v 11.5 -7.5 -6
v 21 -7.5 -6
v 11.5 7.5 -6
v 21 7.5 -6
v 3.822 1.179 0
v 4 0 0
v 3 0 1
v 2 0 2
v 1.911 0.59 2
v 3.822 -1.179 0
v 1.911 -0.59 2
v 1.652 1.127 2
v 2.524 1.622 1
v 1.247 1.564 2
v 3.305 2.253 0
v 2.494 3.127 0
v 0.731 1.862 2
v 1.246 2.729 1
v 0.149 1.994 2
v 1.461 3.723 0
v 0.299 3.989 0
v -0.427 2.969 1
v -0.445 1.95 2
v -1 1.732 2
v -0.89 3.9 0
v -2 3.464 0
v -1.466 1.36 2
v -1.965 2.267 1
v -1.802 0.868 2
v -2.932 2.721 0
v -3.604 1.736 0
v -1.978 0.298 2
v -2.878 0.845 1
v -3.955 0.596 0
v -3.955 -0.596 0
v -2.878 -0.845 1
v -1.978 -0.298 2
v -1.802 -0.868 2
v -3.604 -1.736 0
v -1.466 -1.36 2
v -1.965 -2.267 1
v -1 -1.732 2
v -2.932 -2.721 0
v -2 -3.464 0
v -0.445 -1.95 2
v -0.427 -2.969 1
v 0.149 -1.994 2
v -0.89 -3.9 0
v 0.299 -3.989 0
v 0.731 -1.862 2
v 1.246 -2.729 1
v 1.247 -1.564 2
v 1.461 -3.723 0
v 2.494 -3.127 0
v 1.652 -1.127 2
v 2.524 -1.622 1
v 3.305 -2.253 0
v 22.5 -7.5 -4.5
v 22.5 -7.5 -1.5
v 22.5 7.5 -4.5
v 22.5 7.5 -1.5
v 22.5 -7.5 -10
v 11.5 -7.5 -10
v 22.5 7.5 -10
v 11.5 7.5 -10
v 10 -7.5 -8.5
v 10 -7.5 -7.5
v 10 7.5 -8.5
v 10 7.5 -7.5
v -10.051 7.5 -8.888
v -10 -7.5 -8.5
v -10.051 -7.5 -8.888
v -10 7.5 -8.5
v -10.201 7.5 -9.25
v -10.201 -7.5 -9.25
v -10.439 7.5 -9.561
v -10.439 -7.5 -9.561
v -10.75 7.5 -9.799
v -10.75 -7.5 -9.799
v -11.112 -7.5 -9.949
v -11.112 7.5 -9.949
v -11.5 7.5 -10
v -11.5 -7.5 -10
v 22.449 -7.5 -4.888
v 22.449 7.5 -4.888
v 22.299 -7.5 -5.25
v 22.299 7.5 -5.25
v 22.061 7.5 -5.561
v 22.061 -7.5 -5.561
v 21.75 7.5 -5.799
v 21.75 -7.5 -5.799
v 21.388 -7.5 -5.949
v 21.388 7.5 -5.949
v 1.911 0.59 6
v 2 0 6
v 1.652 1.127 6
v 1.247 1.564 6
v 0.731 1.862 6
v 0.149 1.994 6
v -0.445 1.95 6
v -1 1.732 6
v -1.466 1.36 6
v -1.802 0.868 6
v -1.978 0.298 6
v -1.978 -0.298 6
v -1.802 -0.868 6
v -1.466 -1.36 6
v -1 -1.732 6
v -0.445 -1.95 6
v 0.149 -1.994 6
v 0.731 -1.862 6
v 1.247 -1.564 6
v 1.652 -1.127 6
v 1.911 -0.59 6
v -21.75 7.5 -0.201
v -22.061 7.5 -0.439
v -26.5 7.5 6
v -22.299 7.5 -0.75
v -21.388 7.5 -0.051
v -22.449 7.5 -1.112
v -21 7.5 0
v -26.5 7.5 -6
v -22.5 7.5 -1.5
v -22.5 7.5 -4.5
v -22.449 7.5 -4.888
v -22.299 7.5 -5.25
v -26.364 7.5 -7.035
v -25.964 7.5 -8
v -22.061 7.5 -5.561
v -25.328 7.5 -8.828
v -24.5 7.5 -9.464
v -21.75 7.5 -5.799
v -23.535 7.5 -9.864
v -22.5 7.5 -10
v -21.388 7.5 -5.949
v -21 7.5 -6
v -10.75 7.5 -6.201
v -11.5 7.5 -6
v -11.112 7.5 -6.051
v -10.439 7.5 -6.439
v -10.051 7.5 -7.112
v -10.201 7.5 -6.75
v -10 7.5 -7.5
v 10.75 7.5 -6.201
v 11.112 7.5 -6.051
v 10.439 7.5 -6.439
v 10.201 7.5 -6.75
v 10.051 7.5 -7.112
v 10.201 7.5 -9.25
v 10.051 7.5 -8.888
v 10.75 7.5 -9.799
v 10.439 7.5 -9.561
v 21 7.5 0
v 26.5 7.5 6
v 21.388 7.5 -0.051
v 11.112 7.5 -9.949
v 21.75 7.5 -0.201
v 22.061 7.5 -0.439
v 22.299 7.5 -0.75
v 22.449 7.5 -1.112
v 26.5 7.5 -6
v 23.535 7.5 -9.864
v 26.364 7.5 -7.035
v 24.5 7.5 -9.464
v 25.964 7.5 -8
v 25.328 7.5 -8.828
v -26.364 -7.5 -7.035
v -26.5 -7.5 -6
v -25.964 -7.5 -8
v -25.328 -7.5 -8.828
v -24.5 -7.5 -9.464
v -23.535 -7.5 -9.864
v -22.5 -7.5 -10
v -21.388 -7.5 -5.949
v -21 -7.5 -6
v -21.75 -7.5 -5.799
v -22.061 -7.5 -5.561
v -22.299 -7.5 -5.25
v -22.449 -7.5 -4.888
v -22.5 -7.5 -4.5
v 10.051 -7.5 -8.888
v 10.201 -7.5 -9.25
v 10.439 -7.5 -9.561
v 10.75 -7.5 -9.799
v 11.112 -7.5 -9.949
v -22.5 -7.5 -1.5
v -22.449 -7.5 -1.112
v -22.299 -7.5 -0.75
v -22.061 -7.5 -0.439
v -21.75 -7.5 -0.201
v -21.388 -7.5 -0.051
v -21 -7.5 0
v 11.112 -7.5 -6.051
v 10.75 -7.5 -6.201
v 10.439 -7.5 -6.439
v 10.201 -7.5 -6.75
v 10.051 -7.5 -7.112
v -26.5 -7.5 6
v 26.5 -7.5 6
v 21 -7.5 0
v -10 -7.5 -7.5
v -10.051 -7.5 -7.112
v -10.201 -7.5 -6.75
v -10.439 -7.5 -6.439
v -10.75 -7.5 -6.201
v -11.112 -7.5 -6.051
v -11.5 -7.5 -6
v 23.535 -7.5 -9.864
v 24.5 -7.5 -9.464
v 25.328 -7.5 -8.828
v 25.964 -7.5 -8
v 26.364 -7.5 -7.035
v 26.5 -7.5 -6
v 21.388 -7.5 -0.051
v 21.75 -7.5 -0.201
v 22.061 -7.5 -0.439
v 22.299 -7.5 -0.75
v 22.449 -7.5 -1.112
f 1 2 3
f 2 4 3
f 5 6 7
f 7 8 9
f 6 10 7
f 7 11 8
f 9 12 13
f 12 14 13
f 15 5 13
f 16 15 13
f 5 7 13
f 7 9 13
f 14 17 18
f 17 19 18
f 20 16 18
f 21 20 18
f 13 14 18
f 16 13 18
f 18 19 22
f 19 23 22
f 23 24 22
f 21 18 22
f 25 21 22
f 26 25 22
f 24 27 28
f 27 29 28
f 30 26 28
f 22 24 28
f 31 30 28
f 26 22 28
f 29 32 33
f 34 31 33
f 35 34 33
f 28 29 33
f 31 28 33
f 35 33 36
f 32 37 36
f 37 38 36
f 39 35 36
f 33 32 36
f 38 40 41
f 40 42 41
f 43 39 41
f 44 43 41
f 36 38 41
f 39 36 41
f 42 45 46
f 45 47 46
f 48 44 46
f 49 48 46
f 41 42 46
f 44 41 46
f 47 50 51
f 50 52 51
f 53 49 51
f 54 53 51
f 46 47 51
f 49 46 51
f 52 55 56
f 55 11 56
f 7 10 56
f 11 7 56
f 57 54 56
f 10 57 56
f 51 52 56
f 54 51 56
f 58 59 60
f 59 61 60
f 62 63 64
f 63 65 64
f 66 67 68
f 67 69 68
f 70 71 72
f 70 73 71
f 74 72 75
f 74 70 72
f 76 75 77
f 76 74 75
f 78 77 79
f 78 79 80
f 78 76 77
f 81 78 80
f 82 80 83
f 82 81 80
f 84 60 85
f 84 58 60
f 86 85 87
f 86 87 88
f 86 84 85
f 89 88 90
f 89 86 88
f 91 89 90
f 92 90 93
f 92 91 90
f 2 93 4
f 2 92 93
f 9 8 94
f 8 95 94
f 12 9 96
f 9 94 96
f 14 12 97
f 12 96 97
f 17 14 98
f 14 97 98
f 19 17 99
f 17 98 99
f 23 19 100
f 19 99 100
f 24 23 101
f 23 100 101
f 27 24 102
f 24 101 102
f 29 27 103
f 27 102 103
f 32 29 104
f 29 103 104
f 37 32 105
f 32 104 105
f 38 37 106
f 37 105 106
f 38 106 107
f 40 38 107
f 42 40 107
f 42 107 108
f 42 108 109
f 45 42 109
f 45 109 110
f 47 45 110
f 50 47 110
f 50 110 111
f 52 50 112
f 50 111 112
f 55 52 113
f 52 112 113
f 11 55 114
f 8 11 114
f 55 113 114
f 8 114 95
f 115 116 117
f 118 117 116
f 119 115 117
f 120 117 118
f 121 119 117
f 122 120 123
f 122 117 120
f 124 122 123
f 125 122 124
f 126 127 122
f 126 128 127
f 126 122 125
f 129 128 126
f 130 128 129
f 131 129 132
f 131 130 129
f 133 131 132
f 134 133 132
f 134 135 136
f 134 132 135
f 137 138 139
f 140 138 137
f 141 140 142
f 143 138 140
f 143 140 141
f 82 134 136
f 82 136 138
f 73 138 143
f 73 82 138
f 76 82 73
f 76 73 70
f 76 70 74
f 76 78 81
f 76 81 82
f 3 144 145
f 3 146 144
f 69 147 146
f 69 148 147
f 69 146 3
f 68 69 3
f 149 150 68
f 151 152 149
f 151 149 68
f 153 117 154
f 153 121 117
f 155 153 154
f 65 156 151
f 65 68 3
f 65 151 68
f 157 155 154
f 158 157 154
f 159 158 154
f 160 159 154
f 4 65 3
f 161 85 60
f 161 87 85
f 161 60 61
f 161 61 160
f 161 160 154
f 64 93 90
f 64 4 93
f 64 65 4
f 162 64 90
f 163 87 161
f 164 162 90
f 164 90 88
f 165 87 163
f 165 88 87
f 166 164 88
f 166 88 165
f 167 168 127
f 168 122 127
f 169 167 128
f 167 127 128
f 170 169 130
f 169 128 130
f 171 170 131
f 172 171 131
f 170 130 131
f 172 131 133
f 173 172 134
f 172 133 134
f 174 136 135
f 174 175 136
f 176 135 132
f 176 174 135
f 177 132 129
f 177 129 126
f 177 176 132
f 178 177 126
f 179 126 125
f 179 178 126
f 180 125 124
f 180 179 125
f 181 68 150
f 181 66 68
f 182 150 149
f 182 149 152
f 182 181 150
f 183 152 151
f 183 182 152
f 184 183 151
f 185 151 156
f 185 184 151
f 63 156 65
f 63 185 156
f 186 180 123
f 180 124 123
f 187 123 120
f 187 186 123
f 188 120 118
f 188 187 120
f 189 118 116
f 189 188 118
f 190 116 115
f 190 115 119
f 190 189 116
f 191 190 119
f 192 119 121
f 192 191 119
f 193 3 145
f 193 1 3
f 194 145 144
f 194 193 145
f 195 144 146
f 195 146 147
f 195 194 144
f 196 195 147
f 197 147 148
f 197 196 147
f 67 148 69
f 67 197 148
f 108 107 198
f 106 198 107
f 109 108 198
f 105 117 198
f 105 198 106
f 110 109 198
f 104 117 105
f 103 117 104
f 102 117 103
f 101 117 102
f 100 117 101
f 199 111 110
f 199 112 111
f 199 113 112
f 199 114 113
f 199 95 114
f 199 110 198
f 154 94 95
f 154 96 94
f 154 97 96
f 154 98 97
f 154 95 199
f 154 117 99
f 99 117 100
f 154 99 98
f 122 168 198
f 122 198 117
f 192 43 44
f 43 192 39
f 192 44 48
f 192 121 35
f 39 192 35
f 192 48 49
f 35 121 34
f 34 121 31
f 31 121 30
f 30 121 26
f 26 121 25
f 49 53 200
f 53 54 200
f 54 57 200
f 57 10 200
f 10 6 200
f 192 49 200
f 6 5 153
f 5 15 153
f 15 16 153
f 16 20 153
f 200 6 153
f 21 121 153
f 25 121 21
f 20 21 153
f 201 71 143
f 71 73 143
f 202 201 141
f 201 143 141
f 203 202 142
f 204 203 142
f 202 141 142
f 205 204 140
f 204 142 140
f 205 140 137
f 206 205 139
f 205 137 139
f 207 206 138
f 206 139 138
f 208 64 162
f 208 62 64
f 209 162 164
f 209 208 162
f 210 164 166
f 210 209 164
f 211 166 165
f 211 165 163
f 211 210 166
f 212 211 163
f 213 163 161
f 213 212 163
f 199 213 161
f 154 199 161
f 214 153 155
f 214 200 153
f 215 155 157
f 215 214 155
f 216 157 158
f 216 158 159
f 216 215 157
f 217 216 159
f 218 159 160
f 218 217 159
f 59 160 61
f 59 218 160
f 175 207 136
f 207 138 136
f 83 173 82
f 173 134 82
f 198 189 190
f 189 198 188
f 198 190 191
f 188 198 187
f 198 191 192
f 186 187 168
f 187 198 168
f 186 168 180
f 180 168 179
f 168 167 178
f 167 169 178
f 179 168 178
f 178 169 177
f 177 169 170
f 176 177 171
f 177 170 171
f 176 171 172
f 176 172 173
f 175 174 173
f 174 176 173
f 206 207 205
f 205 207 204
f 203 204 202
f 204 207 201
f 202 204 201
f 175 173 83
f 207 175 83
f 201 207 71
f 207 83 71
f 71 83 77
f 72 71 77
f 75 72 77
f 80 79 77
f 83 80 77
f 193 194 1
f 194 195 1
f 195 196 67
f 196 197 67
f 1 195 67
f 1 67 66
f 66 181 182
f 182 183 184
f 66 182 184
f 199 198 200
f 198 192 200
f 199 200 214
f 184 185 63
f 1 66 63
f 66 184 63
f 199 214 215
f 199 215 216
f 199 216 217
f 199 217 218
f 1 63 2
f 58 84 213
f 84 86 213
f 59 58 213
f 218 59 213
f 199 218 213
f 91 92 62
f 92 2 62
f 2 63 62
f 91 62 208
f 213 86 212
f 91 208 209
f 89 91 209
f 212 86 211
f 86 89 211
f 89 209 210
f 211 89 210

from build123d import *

# Parameters (mm, degrees)
EXTRU_MINCE1_DEPTH                             = 7.5
ESQUISSE4_W                                    = 53
ESQUISSE4_H                                    = 15
BOSS_EXTRU_1_DEPTH                             = 2
FRAISAGE_POUR_VIS_T_TE_FRAIS_E_M41_D           = 4
FRAISAGE_POUR_VIS_T_TE_FRAIS_E_M41_CSINK_D     = 8
FRAISAGE_POUR_VIS_T_TE_FRAIS_E_M41_CSINK_ANGLE = 90
CONG_1_R                                       = 1.5
CONG_2_R                                       = 4


with BuildPart() as part:
    # Esquisse1 → Extru.-Mince1 (new, symmetric)
    with BuildSketch(Plane(origin=(0, 0, 0), x_dir=(1, 0, 0), z_dir=(0, 1, 0))):
        Polygon((-10, 6), (-22.5, 6), (-22.5, 0), (22.5, 0), (22.5, 6), (10, 6), (10, 10), (26.5, 10), (26.5, -4), (-26.5, -4), (-26.5, 10), (-10, 10), align=None)
    extrude(amount=EXTRU_MINCE1_DEPTH, both=True)

    # Esquisse4 → Boss.-Extru.1 (add)
    with BuildSketch(Plane.XY.offset(4)):
        Rectangle(ESQUISSE4_W, ESQUISSE4_H)
    extrude(amount=BOSS_EXTRU_1_DEPTH)

    # Fraisage pour vis à tête fraisée M41 (through all)
    with Locations(Plane(origin=(0, 0, 0), x_dir=(-1, 0, 0), z_dir=(0, 0, -1))):
        with Locations((0, 0)):
            CounterSinkHole(FRAISAGE_POUR_VIS_T_TE_FRAIS_E_M41_D / 2, FRAISAGE_POUR_VIS_T_TE_FRAIS_E_M41_CSINK_D / 2, counter_sink_angle=FRAISAGE_POUR_VIS_T_TE_FRAIS_E_M41_CSINK_ANGLE)

    # Congé1
    cong_1_edges = [part.edges().sort_by_distance(p)[0] for p in [
        (-22.5, 0, -6),
        (-22.5, 0, 0),
        (22.5, 0, 0),
        (22.5, 0, -6),
        (10, 0, -6),
        (10, 0, -10),
        (-10, 0, -10),
        (-10, 0, -6),
    ]]
    fillet(cong_1_edges, radius=CONG_1_R)

    # Congé2
    cong_2_edges = [part.edges().sort_by_distance(p)[0] for p in [
        (26.5, 0, -10),
        (-26.5, 0, -10),
    ]]
    fillet(cong_2_edges, radius=CONG_2_R)


solid = part.part
